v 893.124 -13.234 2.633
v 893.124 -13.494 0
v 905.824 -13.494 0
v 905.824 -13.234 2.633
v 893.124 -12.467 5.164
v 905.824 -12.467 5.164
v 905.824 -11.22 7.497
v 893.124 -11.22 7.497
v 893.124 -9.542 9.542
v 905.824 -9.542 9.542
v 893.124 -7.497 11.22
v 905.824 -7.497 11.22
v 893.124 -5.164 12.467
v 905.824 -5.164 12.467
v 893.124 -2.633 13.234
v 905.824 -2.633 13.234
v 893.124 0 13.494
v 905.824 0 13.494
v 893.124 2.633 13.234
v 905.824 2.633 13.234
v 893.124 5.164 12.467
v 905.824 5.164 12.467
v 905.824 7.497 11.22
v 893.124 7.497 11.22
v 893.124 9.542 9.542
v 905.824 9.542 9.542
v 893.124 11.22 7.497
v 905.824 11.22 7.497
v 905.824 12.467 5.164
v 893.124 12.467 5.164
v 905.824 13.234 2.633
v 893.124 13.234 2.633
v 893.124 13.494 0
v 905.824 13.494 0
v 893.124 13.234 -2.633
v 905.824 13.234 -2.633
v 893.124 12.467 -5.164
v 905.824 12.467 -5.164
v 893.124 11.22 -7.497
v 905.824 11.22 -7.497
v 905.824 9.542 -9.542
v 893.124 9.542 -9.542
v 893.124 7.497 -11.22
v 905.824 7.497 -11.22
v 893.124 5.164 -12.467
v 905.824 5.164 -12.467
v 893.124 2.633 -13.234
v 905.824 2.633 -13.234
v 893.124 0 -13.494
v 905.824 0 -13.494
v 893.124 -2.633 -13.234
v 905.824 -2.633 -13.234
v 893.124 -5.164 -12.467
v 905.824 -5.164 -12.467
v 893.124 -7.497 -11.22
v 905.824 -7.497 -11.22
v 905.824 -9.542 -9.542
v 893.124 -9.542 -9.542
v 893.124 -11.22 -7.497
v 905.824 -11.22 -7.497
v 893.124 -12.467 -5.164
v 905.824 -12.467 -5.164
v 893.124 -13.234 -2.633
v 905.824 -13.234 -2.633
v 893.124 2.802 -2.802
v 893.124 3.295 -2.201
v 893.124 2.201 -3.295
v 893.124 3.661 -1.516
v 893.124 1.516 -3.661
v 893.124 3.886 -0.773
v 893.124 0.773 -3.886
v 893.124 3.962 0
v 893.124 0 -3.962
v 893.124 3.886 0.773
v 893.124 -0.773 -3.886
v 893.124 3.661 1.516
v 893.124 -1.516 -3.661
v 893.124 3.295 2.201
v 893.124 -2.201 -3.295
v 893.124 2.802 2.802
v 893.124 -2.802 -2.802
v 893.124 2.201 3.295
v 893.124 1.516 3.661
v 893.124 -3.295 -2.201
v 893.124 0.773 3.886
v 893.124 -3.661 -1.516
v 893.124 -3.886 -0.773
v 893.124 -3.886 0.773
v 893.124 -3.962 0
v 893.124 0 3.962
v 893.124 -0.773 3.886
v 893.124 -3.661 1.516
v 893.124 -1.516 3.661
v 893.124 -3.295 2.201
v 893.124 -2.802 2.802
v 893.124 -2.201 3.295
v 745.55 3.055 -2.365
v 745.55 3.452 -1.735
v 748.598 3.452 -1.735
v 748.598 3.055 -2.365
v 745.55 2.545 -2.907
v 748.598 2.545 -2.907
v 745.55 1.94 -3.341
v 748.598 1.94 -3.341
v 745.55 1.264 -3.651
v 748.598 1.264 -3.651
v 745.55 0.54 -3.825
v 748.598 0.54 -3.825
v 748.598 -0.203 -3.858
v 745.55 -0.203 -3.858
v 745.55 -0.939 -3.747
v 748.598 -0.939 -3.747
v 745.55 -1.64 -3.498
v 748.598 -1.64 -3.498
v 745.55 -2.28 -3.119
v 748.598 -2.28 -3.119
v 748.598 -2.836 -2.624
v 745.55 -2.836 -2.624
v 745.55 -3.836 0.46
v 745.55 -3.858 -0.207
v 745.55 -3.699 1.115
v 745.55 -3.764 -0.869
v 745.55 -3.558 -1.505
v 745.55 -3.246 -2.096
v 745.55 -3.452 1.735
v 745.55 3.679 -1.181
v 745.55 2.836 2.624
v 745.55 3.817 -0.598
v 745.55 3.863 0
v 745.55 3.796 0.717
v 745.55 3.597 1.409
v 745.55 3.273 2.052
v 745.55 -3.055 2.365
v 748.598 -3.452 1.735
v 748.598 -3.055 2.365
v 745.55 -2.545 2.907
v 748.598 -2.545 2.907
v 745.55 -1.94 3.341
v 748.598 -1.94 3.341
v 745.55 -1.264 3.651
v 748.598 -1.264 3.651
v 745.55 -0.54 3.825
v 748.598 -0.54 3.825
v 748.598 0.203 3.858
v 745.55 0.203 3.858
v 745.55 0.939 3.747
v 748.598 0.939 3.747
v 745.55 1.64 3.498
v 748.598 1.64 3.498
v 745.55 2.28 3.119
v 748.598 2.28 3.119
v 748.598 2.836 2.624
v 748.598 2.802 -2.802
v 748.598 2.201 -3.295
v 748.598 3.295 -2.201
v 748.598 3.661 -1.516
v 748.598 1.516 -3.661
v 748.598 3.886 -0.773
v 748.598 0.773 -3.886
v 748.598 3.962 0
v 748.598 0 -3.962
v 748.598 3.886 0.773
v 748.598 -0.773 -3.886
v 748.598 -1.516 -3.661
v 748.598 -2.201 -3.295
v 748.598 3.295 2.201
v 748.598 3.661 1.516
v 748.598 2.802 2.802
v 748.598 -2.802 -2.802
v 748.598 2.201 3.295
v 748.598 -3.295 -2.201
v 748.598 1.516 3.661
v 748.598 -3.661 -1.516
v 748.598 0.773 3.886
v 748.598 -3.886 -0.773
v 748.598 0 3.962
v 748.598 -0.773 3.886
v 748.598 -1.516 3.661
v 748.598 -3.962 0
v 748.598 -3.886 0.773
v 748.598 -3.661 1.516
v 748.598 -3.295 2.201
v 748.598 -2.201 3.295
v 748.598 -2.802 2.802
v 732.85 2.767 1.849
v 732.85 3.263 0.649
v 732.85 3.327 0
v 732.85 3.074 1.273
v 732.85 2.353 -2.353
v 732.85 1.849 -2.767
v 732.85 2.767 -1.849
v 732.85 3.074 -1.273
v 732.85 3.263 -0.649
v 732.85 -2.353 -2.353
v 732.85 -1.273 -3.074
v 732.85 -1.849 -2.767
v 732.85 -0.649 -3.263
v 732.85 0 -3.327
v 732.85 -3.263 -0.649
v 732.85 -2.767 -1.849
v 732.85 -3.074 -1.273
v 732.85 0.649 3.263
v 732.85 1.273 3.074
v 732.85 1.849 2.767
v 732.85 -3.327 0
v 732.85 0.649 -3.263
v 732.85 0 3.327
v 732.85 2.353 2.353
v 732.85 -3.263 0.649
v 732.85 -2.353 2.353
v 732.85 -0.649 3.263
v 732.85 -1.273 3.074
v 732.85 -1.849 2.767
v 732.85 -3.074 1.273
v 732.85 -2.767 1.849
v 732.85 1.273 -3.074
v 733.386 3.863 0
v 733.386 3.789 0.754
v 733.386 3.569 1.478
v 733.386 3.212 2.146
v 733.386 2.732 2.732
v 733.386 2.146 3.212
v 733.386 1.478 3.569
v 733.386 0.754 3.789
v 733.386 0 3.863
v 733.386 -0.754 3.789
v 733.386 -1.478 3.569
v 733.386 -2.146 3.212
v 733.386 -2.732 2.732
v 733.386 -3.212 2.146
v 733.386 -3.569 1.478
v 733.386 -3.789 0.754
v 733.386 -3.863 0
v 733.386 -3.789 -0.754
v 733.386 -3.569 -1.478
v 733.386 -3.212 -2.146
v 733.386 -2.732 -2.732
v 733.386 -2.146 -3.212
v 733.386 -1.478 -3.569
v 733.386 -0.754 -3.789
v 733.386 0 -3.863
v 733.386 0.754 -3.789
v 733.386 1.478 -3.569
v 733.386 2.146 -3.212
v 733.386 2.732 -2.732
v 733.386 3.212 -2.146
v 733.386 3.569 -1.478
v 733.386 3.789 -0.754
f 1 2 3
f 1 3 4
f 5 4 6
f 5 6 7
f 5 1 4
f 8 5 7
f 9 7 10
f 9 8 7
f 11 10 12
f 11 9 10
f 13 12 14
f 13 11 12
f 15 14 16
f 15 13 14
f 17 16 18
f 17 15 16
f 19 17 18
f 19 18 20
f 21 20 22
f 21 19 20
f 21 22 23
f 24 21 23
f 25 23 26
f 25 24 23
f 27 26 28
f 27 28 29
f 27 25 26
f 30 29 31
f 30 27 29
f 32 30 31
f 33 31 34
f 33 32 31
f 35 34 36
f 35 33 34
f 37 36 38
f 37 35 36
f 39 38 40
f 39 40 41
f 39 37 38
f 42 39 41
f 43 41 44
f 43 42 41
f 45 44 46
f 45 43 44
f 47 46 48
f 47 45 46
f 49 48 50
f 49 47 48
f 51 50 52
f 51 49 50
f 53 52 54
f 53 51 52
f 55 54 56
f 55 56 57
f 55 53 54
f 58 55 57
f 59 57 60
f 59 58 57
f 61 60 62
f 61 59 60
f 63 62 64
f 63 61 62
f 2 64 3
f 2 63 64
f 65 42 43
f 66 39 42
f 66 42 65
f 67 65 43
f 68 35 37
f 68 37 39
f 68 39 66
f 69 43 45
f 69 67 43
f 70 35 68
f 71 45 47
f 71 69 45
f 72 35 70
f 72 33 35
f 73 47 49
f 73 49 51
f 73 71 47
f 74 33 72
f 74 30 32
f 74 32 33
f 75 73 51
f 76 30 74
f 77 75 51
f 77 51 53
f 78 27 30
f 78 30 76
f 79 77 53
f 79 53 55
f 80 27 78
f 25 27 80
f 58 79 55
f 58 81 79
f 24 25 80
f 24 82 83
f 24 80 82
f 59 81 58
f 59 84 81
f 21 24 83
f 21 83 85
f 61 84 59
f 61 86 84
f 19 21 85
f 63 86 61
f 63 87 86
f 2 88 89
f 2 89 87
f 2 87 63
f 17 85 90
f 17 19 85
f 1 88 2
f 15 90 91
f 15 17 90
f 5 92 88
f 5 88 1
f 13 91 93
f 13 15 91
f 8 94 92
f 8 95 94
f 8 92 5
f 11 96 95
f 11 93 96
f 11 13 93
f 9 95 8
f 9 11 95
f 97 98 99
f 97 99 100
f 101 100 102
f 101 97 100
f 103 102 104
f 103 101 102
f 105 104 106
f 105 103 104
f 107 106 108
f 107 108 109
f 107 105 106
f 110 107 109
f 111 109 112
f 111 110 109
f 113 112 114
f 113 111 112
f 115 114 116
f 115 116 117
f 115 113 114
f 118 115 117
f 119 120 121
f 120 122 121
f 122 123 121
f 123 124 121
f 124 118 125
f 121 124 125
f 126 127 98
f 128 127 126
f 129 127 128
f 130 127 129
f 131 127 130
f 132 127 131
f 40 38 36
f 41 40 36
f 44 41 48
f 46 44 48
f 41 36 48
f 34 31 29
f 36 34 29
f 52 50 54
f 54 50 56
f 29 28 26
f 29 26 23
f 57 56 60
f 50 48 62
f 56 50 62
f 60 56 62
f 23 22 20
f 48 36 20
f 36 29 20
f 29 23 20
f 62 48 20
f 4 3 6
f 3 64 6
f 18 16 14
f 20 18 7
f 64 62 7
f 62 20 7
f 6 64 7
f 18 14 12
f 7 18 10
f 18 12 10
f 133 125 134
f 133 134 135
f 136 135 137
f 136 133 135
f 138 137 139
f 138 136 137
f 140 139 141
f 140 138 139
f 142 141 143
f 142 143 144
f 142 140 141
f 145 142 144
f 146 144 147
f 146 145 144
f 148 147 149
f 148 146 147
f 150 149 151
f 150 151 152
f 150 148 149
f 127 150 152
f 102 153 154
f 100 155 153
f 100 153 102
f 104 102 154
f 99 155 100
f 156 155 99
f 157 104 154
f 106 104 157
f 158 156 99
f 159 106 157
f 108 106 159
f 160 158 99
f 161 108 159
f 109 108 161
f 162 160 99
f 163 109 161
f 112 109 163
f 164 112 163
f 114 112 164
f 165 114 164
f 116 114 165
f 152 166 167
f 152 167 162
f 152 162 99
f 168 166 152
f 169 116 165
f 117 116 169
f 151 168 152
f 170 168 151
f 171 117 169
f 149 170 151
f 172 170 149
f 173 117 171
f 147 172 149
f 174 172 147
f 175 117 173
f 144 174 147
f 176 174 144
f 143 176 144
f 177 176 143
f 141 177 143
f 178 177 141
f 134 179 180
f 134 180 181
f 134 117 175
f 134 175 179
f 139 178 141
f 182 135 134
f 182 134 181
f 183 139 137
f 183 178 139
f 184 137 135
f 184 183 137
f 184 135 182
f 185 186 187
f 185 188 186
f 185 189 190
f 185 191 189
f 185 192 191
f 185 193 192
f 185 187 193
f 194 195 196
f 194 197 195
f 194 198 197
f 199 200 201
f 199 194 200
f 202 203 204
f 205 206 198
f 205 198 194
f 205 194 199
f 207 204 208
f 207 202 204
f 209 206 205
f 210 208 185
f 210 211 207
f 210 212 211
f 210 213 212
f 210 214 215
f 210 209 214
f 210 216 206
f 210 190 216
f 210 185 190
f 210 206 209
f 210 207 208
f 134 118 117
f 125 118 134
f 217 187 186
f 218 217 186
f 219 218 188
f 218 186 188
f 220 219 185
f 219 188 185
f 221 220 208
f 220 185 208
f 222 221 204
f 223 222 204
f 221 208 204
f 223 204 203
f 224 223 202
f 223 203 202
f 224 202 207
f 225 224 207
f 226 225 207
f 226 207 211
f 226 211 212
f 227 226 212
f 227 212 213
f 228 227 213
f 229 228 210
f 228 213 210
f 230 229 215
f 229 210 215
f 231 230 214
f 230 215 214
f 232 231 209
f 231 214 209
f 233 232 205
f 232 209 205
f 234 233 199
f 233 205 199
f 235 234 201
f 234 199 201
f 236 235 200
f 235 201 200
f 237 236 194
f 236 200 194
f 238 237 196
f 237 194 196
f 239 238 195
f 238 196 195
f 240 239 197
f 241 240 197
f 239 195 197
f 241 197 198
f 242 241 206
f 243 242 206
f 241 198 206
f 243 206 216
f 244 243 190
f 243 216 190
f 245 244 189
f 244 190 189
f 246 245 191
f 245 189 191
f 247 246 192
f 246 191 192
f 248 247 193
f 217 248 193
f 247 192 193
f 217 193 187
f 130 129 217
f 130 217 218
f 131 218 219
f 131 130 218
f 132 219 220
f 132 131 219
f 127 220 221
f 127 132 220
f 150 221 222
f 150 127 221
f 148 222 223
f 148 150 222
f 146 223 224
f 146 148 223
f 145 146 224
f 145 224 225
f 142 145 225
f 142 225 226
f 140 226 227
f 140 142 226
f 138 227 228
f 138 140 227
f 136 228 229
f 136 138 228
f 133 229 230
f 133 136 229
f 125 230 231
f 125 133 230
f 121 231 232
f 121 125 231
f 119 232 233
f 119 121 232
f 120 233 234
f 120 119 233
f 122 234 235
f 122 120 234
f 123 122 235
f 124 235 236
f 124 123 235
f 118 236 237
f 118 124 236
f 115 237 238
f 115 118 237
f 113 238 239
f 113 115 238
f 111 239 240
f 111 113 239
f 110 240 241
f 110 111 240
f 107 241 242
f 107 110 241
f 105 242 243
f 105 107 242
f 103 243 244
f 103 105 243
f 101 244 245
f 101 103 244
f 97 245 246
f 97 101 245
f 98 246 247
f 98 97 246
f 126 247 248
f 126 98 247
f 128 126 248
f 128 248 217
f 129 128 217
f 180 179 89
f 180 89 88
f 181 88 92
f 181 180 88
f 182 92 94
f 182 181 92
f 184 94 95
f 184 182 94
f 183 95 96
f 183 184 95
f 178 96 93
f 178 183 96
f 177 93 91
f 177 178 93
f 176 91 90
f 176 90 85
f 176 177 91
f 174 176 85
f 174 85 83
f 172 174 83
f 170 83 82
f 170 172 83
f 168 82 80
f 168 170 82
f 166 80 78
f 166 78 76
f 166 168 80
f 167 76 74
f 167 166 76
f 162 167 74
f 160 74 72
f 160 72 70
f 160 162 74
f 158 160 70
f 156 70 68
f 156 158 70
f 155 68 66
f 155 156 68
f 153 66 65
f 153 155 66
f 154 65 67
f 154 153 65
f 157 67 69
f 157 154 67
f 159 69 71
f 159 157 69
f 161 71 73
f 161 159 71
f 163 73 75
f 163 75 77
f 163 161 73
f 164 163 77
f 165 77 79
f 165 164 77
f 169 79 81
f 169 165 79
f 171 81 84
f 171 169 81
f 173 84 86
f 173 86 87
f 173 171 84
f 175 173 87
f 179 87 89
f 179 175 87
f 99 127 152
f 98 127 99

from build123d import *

# Parameters (mm, degrees)
SKETCH1_W           = 12.7
SKETCH1_H           = 3.86334
BOSS_EXTRUDE1_DEPTH = 3.048
SKETCH3_R           = 3.9624
BOSS_EXTRUDE2_DEPTH = 144.526
SKETCH4_R           = 13.49375
BOSS_EXTRUDE3_DEPTH = 12.7
CHAMFER1_SIZE       = 0.53594


with BuildPart() as part:
    # Sketch1 → Revolve1 (revolve)
    with BuildSketch(Plane.XY):
        with Locations((739.199890203, 1.93167)):
            Rectangle(SKETCH1_W, SKETCH1_H)
    revolve(axis=Axis((732.849890203, 0, 0), (1, 0, 0)))

    # Sketch2 → Boss-Extrude1 (add)
    with BuildSketch(Plane(origin=(745.549890203, 0, 0), x_dir=(0, 0, -1), z_dir=(1, 0, 0))):
        with BuildLine():
            Line((2.623507611, -2.835948478), (-1.73539242, -3.451638611))
            ThreePointArc((-1.73539242, -3.451638611), (-3.825367985, -0.540329282), (-2.623507611, 2.835948478))
            Line((-2.623507611, 2.835948478), (1.73539242, 3.451638611))
            ThreePointArc((1.73539242, 3.451638611), (3.825367985, 0.540329282), (2.623507611, -2.835948478))
        make_face()
    extrude(amount=BOSS_EXTRUDE1_DEPTH)

    # Sketch3 → Boss-Extrude2 (add)
    with BuildSketch(Plane(origin=(748.597890203, 0, 0), x_dir=(0, -1, 0), z_dir=(-1, 0, 0))):
        Circle(SKETCH3_R)
    extrude(amount=-BOSS_EXTRUDE2_DEPTH)

    # Sketch4 → Boss-Extrude3 (add)
    with BuildSketch(Plane(origin=(893.123890203, 0, 0), x_dir=(0, -1, 0), z_dir=(-1, 0, 0))):
        Circle(SKETCH4_R)
    extrude(amount=-BOSS_EXTRUDE3_DEPTH)

    # Chamfer1
    chamfer1_edges = [part.edges().sort_by_distance(p)[0] for p in [
        (732.849890203, -3.86334, 0),
    ]]
    chamfer(chamfer1_edges, length=CHAMFER1_SIZE)


solid = part.part
